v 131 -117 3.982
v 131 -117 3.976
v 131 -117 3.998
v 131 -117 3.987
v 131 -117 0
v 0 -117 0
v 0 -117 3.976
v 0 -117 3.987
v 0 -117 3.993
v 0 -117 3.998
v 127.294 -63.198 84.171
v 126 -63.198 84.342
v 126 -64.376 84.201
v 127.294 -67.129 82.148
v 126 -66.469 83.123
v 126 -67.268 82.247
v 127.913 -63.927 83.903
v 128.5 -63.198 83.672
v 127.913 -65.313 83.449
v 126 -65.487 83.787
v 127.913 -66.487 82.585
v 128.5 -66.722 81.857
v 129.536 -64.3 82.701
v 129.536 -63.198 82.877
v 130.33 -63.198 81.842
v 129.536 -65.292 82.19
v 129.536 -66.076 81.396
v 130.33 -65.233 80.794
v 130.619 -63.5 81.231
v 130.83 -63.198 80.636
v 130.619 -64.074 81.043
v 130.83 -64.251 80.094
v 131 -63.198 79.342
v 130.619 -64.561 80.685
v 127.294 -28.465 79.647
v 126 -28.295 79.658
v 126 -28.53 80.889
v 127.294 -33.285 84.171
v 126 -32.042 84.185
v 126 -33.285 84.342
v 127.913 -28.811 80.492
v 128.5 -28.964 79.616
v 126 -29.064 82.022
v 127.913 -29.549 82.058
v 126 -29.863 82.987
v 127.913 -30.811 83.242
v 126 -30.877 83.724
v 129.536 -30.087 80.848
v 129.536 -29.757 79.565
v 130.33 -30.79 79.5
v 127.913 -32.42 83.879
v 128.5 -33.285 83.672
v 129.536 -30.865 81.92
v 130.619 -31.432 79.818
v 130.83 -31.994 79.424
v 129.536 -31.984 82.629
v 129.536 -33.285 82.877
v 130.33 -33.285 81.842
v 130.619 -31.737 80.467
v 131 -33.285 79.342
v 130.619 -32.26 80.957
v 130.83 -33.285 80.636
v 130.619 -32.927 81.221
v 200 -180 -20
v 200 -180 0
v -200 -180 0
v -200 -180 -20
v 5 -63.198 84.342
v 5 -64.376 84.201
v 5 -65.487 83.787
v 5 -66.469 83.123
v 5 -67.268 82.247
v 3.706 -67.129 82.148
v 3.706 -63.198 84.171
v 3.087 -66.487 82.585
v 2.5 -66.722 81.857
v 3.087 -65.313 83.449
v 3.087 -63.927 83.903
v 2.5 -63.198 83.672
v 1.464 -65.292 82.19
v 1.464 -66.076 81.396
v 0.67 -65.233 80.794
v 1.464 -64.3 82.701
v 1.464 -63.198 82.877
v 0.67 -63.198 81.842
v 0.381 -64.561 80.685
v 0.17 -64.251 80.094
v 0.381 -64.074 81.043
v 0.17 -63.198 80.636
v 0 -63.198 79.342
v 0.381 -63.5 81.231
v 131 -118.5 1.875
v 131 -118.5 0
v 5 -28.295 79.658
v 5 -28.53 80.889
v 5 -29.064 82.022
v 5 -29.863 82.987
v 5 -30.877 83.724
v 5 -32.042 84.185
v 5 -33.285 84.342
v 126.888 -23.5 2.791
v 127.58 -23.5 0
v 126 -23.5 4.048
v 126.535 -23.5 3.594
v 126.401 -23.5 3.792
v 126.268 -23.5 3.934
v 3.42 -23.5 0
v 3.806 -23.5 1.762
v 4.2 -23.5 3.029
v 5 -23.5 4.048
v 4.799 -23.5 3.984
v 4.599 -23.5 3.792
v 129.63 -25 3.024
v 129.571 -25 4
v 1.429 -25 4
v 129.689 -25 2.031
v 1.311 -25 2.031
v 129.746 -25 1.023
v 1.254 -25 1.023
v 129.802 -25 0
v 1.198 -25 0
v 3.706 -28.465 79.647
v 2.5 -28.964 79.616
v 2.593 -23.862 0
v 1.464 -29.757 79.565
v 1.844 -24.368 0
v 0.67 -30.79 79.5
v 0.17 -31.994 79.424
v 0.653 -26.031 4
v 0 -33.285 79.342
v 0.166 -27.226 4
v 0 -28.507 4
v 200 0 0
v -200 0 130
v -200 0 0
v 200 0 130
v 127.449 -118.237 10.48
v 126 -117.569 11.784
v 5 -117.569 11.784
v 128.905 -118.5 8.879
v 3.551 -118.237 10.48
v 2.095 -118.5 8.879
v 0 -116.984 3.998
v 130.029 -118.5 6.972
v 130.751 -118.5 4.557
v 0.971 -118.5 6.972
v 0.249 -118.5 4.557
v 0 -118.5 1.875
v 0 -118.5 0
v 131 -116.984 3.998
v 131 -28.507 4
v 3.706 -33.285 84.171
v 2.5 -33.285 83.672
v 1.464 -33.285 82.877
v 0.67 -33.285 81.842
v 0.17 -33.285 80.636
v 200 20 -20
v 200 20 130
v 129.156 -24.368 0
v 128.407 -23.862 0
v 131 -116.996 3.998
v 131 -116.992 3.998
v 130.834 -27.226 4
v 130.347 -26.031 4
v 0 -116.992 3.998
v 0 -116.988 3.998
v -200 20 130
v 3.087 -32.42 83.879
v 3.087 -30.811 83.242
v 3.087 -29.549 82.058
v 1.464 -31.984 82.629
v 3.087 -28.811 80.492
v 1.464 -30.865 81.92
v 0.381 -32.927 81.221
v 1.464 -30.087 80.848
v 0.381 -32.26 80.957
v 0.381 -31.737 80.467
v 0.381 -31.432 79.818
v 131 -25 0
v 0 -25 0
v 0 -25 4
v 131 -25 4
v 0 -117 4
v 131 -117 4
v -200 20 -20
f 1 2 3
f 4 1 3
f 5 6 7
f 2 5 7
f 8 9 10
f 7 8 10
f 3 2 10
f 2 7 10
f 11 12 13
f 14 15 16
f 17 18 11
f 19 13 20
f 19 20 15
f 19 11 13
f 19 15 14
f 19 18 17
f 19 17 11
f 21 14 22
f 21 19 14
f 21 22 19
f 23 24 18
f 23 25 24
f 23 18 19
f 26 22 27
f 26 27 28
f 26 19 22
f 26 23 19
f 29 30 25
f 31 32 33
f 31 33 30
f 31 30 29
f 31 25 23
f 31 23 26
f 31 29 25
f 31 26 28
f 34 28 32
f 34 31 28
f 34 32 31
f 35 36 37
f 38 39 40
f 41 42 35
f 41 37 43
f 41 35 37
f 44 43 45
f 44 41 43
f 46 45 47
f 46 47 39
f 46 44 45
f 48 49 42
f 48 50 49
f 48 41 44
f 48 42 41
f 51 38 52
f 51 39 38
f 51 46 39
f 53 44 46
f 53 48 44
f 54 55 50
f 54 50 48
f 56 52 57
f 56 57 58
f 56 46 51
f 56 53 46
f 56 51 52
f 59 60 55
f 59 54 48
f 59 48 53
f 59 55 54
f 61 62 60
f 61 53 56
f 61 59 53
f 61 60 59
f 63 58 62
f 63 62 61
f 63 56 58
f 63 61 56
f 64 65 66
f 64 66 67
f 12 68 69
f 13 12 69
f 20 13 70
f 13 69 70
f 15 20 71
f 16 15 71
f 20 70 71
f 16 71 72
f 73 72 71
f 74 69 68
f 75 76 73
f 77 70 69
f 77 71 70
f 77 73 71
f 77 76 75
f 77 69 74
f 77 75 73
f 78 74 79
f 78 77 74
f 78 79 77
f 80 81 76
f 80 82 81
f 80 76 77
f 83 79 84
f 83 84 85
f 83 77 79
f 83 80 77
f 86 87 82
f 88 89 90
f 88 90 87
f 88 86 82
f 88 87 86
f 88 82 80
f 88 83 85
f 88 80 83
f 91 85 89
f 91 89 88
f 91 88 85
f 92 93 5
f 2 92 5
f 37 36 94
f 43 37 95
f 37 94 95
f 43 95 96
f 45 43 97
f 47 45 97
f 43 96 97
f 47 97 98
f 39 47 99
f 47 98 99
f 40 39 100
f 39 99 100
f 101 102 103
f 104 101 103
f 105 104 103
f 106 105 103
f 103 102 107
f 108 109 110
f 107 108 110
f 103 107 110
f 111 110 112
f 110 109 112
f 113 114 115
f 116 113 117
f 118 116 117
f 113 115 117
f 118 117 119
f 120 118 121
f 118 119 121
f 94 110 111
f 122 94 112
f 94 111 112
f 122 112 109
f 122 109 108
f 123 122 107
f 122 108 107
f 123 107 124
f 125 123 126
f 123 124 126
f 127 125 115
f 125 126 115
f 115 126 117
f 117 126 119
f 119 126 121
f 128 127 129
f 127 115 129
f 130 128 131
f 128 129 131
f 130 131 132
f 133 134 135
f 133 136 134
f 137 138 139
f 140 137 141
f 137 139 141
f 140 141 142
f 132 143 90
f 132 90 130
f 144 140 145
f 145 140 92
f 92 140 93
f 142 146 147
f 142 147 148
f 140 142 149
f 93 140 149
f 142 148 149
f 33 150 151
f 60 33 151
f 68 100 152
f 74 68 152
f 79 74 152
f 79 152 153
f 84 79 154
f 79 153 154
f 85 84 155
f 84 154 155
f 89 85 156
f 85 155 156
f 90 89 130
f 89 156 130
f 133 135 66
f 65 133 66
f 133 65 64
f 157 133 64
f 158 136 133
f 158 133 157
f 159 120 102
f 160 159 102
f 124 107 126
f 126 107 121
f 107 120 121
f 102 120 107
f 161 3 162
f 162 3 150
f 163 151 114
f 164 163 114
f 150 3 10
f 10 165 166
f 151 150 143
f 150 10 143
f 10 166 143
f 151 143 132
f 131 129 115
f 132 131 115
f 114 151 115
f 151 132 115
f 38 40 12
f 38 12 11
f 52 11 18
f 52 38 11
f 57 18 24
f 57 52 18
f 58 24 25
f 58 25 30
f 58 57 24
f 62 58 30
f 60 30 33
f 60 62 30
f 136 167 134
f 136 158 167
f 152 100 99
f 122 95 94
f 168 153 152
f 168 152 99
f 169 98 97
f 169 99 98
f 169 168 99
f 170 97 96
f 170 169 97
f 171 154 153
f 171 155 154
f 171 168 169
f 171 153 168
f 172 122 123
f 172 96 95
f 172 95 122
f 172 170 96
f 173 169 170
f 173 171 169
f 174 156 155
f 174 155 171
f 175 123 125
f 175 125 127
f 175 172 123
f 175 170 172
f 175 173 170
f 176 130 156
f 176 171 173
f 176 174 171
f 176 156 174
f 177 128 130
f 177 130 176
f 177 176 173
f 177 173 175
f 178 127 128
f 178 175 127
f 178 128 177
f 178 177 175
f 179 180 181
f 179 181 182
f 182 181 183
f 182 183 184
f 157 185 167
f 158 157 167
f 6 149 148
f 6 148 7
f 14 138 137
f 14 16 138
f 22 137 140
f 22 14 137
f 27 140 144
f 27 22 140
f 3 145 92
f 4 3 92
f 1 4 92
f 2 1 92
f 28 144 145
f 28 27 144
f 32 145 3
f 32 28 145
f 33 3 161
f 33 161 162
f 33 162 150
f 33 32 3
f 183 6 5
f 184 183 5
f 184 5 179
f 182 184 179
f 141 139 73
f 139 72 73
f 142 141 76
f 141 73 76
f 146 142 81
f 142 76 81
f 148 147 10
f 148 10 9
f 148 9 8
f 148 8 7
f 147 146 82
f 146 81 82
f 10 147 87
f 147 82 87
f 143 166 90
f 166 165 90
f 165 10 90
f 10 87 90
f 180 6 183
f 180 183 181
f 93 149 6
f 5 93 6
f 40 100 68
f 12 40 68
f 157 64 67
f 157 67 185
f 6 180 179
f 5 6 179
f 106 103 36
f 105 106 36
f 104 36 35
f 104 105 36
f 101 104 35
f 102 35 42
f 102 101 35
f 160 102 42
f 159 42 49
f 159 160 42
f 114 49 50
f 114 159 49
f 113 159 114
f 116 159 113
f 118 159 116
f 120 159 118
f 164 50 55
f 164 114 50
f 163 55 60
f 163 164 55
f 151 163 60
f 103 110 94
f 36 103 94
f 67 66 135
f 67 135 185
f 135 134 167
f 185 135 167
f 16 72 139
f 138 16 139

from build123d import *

# Parameters (mm, degrees)
F1_DEPTH     = 200
F2_W         = 131
F2_H         = 92
F3_DEPTH     = 4
F5_DEPTH     = 131
F6_T1_DEPTH  = 100.6767614544
F6_T3_DEPTH  = 139.007901378
F6_T5_DEPTH  = 121
F6_T7_DEPTH  = 88.2624487626
F6_T9_DEPTH  = 29.9131719037
F6_T14_DEPTH = 5
F6_T20_DEPTH = 5
F6_T26_DEPTH = 5
F6_T32_DEPTH = 5


# Not quite as in the source:
# - a fillet or chamfer that OpenCascade refuses, or shapes differently, is made with other operations: its cross-section is extruded or revolved along the edge and cut away or added
# - two fillets or chamfers of one size are made in one step


with BuildPart() as f1:
    # F0 (on Right) → F1 (new body, symmetric)
    with BuildSketch(Plane.YZ):
        Polygon((0, 0), (-180, 0), (-180, -20), (20, -20), (20, 130), (0, 130), align=None)
    extrude(amount=F1_DEPTH, both=True)


with BuildPart() as f3:
    # F2 (on face) → F3 (new body)
    with BuildSketch(Plane.XY):
        with Locations((65.5, -71)):
            Rectangle(F2_W, F2_H)
    extrude(amount=F3_DEPTH)


with BuildPart() as f5:
    # F4 (on Right) → F5 (new body, through all)
    with BuildSketch(Plane.YZ):
        Polygon((-117, 3.9981720038), (-25, 4), (-25, 0), (-23.5, 0), (-23.5, 4.0475159867), (-28.5921140468, 84.3416133777), (-65.772183231, 84.3416133777), (-118.5, 10.4804740827), (-118.5, 0), (-116.9999205582, 0), align=None)
    extrude(amount=F5_DEPTH)

    # F6: fillet of radius 5 on 9 edges, made by hand

    # F6_s2 → F6_t1 (cut)
    with BuildSketch(Plane(origin=(0, 16.184877417, 22.6717804496), x_dir=(1, 0, 0), z_dir=(0, -0.581018257, -0.8138905239))):
        with BuildLine():
            ThreePointArc((5, 102.5353738726), (1.4644660941, 101.0709077785), (0, 97.5353738726))
            Line((0, 97.5353738726), (0, 102.5353738726))
            Line((0, 102.5353738726), (5, 102.5353738726))
        make_face()
        with BuildLine():
            ThreePointArc((126, 102.5353738726), (129.5355339059, 101.0709077785), (131, 97.5353738726))
            Line((131, 97.5353738726), (131, 102.5353738726))
            Line((131, 102.5353738726), (126, 102.5353738726))
        make_face()
    extrude(amount=F6_T1_DEPTH, mode=Mode.SUBTRACT)

    # F6_s4 → F6_t3 (cut)
    with BuildSketch(Plane.YZ.offset(-4.003950689)):
        with BuildLine():
            ThreePointArc((-117.5694526197, 11.7839850923), (-118.2616836885, 10.4041375419), (-118.5, 8.8788938071))
            Line((-118.5, 8.8788938071), (-118.5, 10.4804740827))
            Line((-118.5, 10.4804740827), (-117.5694526197, 11.7839850923))
        make_face()
    extrude(amount=F6_T3_DEPTH, mode=Mode.SUBTRACT)

    # F6_s6 → F6_t5 (cut)
    with BuildSketch(Plane.YZ.offset(5)):
        with BuildLine():
            ThreePointArc((-63.1982391278, 84.3416133777), (-65.4867477659, 83.7871423916), (-67.2676917475, 82.246704663))
            Line((-67.2676917475, 82.246704663), (-65.772183231, 84.3416133777))
            Line((-65.772183231, 84.3416133777), (-63.1982391278, 84.3416133777))
        make_face()
        with BuildLine():
            ThreePointArc((-28.2950916938, 79.6580690739), (-29.8632459605, 82.9873148521), (-33.2850672241, 84.3416133777))
            Line((-33.2850672241, 84.3416133777), (-28.5921140468, 84.3416133777))
            Line((-28.5921140468, 84.3416133777), (-28.2950916938, 79.6580690739))
        make_face()
    extrude(amount=F6_T5_DEPTH, mode=Mode.SUBTRACT)

    # F6_s8 → F6_t7 (cut)
    with BuildSketch(Plane(origin=(0, 0.4413453849, -6.9592764405), x_dir=(1, 0, 0), z_dir=(0, -0.0632911392, 0.997995106))):
        with BuildLine():
            ThreePointArc((5, -23.1967130942), (1.4644660941, -24.6611791883), (0, -28.1967130942))
            Line((0, -28.1967130942), (0, -23.1967130942))
            Line((0, -23.1967130942), (5, -23.1967130942))
        make_face()
        with BuildLine():
            ThreePointArc((126, -23.1967130942), (129.5355339059, -24.6611791883), (131, -28.1967130942))
            Line((131, -28.1967130942), (131, -23.1967130942))
            Line((131, -23.1967130942), (126, -23.1967130942))
        make_face()
    extrude(amount=F6_T7_DEPTH, mode=Mode.SUBTRACT)

    # F6_s10 → F6_t9 (cut)
    with BuildSketch(Plane.XZ.offset(33.2850672241)):
        with BuildLine():
            ThreePointArc((5, 84.3416133777), (1.4644660941, 82.8771472836), (0, 79.3416133777))
            Line((0, 79.3416133777), (0, 84.3416133777))
            Line((0, 84.3416133777), (5, 84.3416133777))
        make_face()
        with BuildLine():
            ThreePointArc((126, 84.3416133777), (129.5355339059, 82.8771472836), (131, 79.3416133777))
            Line((131, 79.3416133777), (131, 84.3416133777))
            Line((131, 84.3416133777), (126, 84.3416133777))
        make_face()
    extrude(amount=F6_T9_DEPTH, mode=Mode.SUBTRACT)


with BuildPart() as f6_tool12:
    # F6_s13 → F6_t14 (new body)
    with BuildSketch(Plane.YZ.offset(5)):
        Polygon((-63.1982391278, 79.3416133777), (-63.1982391278, 84.3416133777), (-65.772183231, 84.3416133777), (-67.2676917475, 82.246704663), align=None)
    extrude(amount=-F6_T14_DEPTH)

    # F6_s15 → F6_t16 (revolve, cut)
    with BuildSketch(Plane(origin=(5, -63.1982391278, 79.3416133777), x_dir=(0, 0.4577017276, -0.8891058028), z_dir=(0, 0.8891058028, 0.4577017276))):
        with BuildLine():
            ThreePointArc((0, -5), (5, 0), (0, 5))
            Line((0, 5), (0, -5))
        make_face()
    revolve(axis=Axis((5, -63.1982391278, 79.3416133777), (-1, 0, 0)), mode=Mode.SUBTRACT)


with BuildPart() as f5_1:
    add(f5.part)

    # F6_t11: cut F6_tool12
    add(f6_tool12.part, mode=Mode.SUBTRACT)


with BuildPart() as f6_tool18:
    # F6_s19 → F6_t20 (new body)
    with BuildSketch(Plane.YZ.offset(126)):
        Polygon((-63.1982391278, 79.3416133777), (-63.1982391278, 84.3416133777), (-65.772183231, 84.3416133777), (-67.2676917475, 82.246704663), align=None)
    extrude(amount=F6_T20_DEPTH)

    # F6_s21 → F6_t22 (revolve, cut)
    with BuildSketch(Plane(origin=(126, -63.1982391278, 79.3416133777), x_dir=(0, 0.4577017276, -0.8891058028), z_dir=(0, -0.8891058028, -0.4577017276))):
        with BuildLine():
            ThreePointArc((0, -5), (5, 0), (0, 5))
            Line((0, 5), (0, -5))
        make_face()
    revolve(axis=Axis((126, -63.1982391278, 79.3416133777), (1, 0, 0)), mode=Mode.SUBTRACT)


with BuildPart() as f5_2:
    add(f5_1.part)

    # F6_t17: cut F6_tool18
    add(f6_tool18.part, mode=Mode.SUBTRACT)


with BuildPart() as f6_tool24:
    # F6_s25 → F6_t26 (new body)
    with BuildSketch(Plane.YZ.offset(5)):
        Polygon((-33.2850672241, 79.3416133777), (-28.2950916938, 79.6580690739), (-28.5921140468, 84.3416133777), (-33.2850672241, 84.3416133777), align=None)
    extrude(amount=-F6_T26_DEPTH)

    # F6_s27 → F6_t28 (revolve, cut)
    with BuildSketch(Plane(origin=(5, -33.2850672241, 79.3416133777), x_dir=(0, -0.6843642527, -0.7291402949), z_dir=(0, 0.7291402949, -0.6843642527))):
        with BuildLine():
            ThreePointArc((0, -5), (5, 0), (0, 5))
            Line((0, 5), (0, -5))
        make_face()
    revolve(axis=Axis((5, -33.2850672241, 79.3416133777), (-1, 0, 0)), mode=Mode.SUBTRACT)


with BuildPart() as f5_3:
    add(f5_2.part)

    # F6_t23: cut F6_tool24
    add(f6_tool24.part, mode=Mode.SUBTRACT)


with BuildPart() as f6_tool30:
    # F6_s31 → F6_t32 (new body)
    with BuildSketch(Plane.YZ.offset(126)):
        Polygon((-33.2850672241, 79.3416133777), (-28.2950916938, 79.6580690739), (-28.5921140468, 84.3416133777), (-33.2850672241, 84.3416133777), align=None)
    extrude(amount=F6_T32_DEPTH)

    # F6_s33 → F6_t34 (revolve, cut)
    with BuildSketch(Plane(origin=(126, -33.2850672241, 79.3416133777), x_dir=(0, -0.6843642527, -0.7291402949), z_dir=(0, -0.7291402949, 0.6843642527))):
        with BuildLine():
            ThreePointArc((0, -5), (5, 0), (0, 5))
            Line((0, 5), (0, -5))
        make_face()
    revolve(axis=Axis((126, -33.2850672241, 79.3416133777), (1, 0, 0)), mode=Mode.SUBTRACT)


with BuildPart() as f5_4:
    add(f5_3.part)

    # F6_t29: cut F6_tool30
    add(f6_tool30.part, mode=Mode.SUBTRACT)


solid = Compound([f1.part, f3.part, f5_4.part])
